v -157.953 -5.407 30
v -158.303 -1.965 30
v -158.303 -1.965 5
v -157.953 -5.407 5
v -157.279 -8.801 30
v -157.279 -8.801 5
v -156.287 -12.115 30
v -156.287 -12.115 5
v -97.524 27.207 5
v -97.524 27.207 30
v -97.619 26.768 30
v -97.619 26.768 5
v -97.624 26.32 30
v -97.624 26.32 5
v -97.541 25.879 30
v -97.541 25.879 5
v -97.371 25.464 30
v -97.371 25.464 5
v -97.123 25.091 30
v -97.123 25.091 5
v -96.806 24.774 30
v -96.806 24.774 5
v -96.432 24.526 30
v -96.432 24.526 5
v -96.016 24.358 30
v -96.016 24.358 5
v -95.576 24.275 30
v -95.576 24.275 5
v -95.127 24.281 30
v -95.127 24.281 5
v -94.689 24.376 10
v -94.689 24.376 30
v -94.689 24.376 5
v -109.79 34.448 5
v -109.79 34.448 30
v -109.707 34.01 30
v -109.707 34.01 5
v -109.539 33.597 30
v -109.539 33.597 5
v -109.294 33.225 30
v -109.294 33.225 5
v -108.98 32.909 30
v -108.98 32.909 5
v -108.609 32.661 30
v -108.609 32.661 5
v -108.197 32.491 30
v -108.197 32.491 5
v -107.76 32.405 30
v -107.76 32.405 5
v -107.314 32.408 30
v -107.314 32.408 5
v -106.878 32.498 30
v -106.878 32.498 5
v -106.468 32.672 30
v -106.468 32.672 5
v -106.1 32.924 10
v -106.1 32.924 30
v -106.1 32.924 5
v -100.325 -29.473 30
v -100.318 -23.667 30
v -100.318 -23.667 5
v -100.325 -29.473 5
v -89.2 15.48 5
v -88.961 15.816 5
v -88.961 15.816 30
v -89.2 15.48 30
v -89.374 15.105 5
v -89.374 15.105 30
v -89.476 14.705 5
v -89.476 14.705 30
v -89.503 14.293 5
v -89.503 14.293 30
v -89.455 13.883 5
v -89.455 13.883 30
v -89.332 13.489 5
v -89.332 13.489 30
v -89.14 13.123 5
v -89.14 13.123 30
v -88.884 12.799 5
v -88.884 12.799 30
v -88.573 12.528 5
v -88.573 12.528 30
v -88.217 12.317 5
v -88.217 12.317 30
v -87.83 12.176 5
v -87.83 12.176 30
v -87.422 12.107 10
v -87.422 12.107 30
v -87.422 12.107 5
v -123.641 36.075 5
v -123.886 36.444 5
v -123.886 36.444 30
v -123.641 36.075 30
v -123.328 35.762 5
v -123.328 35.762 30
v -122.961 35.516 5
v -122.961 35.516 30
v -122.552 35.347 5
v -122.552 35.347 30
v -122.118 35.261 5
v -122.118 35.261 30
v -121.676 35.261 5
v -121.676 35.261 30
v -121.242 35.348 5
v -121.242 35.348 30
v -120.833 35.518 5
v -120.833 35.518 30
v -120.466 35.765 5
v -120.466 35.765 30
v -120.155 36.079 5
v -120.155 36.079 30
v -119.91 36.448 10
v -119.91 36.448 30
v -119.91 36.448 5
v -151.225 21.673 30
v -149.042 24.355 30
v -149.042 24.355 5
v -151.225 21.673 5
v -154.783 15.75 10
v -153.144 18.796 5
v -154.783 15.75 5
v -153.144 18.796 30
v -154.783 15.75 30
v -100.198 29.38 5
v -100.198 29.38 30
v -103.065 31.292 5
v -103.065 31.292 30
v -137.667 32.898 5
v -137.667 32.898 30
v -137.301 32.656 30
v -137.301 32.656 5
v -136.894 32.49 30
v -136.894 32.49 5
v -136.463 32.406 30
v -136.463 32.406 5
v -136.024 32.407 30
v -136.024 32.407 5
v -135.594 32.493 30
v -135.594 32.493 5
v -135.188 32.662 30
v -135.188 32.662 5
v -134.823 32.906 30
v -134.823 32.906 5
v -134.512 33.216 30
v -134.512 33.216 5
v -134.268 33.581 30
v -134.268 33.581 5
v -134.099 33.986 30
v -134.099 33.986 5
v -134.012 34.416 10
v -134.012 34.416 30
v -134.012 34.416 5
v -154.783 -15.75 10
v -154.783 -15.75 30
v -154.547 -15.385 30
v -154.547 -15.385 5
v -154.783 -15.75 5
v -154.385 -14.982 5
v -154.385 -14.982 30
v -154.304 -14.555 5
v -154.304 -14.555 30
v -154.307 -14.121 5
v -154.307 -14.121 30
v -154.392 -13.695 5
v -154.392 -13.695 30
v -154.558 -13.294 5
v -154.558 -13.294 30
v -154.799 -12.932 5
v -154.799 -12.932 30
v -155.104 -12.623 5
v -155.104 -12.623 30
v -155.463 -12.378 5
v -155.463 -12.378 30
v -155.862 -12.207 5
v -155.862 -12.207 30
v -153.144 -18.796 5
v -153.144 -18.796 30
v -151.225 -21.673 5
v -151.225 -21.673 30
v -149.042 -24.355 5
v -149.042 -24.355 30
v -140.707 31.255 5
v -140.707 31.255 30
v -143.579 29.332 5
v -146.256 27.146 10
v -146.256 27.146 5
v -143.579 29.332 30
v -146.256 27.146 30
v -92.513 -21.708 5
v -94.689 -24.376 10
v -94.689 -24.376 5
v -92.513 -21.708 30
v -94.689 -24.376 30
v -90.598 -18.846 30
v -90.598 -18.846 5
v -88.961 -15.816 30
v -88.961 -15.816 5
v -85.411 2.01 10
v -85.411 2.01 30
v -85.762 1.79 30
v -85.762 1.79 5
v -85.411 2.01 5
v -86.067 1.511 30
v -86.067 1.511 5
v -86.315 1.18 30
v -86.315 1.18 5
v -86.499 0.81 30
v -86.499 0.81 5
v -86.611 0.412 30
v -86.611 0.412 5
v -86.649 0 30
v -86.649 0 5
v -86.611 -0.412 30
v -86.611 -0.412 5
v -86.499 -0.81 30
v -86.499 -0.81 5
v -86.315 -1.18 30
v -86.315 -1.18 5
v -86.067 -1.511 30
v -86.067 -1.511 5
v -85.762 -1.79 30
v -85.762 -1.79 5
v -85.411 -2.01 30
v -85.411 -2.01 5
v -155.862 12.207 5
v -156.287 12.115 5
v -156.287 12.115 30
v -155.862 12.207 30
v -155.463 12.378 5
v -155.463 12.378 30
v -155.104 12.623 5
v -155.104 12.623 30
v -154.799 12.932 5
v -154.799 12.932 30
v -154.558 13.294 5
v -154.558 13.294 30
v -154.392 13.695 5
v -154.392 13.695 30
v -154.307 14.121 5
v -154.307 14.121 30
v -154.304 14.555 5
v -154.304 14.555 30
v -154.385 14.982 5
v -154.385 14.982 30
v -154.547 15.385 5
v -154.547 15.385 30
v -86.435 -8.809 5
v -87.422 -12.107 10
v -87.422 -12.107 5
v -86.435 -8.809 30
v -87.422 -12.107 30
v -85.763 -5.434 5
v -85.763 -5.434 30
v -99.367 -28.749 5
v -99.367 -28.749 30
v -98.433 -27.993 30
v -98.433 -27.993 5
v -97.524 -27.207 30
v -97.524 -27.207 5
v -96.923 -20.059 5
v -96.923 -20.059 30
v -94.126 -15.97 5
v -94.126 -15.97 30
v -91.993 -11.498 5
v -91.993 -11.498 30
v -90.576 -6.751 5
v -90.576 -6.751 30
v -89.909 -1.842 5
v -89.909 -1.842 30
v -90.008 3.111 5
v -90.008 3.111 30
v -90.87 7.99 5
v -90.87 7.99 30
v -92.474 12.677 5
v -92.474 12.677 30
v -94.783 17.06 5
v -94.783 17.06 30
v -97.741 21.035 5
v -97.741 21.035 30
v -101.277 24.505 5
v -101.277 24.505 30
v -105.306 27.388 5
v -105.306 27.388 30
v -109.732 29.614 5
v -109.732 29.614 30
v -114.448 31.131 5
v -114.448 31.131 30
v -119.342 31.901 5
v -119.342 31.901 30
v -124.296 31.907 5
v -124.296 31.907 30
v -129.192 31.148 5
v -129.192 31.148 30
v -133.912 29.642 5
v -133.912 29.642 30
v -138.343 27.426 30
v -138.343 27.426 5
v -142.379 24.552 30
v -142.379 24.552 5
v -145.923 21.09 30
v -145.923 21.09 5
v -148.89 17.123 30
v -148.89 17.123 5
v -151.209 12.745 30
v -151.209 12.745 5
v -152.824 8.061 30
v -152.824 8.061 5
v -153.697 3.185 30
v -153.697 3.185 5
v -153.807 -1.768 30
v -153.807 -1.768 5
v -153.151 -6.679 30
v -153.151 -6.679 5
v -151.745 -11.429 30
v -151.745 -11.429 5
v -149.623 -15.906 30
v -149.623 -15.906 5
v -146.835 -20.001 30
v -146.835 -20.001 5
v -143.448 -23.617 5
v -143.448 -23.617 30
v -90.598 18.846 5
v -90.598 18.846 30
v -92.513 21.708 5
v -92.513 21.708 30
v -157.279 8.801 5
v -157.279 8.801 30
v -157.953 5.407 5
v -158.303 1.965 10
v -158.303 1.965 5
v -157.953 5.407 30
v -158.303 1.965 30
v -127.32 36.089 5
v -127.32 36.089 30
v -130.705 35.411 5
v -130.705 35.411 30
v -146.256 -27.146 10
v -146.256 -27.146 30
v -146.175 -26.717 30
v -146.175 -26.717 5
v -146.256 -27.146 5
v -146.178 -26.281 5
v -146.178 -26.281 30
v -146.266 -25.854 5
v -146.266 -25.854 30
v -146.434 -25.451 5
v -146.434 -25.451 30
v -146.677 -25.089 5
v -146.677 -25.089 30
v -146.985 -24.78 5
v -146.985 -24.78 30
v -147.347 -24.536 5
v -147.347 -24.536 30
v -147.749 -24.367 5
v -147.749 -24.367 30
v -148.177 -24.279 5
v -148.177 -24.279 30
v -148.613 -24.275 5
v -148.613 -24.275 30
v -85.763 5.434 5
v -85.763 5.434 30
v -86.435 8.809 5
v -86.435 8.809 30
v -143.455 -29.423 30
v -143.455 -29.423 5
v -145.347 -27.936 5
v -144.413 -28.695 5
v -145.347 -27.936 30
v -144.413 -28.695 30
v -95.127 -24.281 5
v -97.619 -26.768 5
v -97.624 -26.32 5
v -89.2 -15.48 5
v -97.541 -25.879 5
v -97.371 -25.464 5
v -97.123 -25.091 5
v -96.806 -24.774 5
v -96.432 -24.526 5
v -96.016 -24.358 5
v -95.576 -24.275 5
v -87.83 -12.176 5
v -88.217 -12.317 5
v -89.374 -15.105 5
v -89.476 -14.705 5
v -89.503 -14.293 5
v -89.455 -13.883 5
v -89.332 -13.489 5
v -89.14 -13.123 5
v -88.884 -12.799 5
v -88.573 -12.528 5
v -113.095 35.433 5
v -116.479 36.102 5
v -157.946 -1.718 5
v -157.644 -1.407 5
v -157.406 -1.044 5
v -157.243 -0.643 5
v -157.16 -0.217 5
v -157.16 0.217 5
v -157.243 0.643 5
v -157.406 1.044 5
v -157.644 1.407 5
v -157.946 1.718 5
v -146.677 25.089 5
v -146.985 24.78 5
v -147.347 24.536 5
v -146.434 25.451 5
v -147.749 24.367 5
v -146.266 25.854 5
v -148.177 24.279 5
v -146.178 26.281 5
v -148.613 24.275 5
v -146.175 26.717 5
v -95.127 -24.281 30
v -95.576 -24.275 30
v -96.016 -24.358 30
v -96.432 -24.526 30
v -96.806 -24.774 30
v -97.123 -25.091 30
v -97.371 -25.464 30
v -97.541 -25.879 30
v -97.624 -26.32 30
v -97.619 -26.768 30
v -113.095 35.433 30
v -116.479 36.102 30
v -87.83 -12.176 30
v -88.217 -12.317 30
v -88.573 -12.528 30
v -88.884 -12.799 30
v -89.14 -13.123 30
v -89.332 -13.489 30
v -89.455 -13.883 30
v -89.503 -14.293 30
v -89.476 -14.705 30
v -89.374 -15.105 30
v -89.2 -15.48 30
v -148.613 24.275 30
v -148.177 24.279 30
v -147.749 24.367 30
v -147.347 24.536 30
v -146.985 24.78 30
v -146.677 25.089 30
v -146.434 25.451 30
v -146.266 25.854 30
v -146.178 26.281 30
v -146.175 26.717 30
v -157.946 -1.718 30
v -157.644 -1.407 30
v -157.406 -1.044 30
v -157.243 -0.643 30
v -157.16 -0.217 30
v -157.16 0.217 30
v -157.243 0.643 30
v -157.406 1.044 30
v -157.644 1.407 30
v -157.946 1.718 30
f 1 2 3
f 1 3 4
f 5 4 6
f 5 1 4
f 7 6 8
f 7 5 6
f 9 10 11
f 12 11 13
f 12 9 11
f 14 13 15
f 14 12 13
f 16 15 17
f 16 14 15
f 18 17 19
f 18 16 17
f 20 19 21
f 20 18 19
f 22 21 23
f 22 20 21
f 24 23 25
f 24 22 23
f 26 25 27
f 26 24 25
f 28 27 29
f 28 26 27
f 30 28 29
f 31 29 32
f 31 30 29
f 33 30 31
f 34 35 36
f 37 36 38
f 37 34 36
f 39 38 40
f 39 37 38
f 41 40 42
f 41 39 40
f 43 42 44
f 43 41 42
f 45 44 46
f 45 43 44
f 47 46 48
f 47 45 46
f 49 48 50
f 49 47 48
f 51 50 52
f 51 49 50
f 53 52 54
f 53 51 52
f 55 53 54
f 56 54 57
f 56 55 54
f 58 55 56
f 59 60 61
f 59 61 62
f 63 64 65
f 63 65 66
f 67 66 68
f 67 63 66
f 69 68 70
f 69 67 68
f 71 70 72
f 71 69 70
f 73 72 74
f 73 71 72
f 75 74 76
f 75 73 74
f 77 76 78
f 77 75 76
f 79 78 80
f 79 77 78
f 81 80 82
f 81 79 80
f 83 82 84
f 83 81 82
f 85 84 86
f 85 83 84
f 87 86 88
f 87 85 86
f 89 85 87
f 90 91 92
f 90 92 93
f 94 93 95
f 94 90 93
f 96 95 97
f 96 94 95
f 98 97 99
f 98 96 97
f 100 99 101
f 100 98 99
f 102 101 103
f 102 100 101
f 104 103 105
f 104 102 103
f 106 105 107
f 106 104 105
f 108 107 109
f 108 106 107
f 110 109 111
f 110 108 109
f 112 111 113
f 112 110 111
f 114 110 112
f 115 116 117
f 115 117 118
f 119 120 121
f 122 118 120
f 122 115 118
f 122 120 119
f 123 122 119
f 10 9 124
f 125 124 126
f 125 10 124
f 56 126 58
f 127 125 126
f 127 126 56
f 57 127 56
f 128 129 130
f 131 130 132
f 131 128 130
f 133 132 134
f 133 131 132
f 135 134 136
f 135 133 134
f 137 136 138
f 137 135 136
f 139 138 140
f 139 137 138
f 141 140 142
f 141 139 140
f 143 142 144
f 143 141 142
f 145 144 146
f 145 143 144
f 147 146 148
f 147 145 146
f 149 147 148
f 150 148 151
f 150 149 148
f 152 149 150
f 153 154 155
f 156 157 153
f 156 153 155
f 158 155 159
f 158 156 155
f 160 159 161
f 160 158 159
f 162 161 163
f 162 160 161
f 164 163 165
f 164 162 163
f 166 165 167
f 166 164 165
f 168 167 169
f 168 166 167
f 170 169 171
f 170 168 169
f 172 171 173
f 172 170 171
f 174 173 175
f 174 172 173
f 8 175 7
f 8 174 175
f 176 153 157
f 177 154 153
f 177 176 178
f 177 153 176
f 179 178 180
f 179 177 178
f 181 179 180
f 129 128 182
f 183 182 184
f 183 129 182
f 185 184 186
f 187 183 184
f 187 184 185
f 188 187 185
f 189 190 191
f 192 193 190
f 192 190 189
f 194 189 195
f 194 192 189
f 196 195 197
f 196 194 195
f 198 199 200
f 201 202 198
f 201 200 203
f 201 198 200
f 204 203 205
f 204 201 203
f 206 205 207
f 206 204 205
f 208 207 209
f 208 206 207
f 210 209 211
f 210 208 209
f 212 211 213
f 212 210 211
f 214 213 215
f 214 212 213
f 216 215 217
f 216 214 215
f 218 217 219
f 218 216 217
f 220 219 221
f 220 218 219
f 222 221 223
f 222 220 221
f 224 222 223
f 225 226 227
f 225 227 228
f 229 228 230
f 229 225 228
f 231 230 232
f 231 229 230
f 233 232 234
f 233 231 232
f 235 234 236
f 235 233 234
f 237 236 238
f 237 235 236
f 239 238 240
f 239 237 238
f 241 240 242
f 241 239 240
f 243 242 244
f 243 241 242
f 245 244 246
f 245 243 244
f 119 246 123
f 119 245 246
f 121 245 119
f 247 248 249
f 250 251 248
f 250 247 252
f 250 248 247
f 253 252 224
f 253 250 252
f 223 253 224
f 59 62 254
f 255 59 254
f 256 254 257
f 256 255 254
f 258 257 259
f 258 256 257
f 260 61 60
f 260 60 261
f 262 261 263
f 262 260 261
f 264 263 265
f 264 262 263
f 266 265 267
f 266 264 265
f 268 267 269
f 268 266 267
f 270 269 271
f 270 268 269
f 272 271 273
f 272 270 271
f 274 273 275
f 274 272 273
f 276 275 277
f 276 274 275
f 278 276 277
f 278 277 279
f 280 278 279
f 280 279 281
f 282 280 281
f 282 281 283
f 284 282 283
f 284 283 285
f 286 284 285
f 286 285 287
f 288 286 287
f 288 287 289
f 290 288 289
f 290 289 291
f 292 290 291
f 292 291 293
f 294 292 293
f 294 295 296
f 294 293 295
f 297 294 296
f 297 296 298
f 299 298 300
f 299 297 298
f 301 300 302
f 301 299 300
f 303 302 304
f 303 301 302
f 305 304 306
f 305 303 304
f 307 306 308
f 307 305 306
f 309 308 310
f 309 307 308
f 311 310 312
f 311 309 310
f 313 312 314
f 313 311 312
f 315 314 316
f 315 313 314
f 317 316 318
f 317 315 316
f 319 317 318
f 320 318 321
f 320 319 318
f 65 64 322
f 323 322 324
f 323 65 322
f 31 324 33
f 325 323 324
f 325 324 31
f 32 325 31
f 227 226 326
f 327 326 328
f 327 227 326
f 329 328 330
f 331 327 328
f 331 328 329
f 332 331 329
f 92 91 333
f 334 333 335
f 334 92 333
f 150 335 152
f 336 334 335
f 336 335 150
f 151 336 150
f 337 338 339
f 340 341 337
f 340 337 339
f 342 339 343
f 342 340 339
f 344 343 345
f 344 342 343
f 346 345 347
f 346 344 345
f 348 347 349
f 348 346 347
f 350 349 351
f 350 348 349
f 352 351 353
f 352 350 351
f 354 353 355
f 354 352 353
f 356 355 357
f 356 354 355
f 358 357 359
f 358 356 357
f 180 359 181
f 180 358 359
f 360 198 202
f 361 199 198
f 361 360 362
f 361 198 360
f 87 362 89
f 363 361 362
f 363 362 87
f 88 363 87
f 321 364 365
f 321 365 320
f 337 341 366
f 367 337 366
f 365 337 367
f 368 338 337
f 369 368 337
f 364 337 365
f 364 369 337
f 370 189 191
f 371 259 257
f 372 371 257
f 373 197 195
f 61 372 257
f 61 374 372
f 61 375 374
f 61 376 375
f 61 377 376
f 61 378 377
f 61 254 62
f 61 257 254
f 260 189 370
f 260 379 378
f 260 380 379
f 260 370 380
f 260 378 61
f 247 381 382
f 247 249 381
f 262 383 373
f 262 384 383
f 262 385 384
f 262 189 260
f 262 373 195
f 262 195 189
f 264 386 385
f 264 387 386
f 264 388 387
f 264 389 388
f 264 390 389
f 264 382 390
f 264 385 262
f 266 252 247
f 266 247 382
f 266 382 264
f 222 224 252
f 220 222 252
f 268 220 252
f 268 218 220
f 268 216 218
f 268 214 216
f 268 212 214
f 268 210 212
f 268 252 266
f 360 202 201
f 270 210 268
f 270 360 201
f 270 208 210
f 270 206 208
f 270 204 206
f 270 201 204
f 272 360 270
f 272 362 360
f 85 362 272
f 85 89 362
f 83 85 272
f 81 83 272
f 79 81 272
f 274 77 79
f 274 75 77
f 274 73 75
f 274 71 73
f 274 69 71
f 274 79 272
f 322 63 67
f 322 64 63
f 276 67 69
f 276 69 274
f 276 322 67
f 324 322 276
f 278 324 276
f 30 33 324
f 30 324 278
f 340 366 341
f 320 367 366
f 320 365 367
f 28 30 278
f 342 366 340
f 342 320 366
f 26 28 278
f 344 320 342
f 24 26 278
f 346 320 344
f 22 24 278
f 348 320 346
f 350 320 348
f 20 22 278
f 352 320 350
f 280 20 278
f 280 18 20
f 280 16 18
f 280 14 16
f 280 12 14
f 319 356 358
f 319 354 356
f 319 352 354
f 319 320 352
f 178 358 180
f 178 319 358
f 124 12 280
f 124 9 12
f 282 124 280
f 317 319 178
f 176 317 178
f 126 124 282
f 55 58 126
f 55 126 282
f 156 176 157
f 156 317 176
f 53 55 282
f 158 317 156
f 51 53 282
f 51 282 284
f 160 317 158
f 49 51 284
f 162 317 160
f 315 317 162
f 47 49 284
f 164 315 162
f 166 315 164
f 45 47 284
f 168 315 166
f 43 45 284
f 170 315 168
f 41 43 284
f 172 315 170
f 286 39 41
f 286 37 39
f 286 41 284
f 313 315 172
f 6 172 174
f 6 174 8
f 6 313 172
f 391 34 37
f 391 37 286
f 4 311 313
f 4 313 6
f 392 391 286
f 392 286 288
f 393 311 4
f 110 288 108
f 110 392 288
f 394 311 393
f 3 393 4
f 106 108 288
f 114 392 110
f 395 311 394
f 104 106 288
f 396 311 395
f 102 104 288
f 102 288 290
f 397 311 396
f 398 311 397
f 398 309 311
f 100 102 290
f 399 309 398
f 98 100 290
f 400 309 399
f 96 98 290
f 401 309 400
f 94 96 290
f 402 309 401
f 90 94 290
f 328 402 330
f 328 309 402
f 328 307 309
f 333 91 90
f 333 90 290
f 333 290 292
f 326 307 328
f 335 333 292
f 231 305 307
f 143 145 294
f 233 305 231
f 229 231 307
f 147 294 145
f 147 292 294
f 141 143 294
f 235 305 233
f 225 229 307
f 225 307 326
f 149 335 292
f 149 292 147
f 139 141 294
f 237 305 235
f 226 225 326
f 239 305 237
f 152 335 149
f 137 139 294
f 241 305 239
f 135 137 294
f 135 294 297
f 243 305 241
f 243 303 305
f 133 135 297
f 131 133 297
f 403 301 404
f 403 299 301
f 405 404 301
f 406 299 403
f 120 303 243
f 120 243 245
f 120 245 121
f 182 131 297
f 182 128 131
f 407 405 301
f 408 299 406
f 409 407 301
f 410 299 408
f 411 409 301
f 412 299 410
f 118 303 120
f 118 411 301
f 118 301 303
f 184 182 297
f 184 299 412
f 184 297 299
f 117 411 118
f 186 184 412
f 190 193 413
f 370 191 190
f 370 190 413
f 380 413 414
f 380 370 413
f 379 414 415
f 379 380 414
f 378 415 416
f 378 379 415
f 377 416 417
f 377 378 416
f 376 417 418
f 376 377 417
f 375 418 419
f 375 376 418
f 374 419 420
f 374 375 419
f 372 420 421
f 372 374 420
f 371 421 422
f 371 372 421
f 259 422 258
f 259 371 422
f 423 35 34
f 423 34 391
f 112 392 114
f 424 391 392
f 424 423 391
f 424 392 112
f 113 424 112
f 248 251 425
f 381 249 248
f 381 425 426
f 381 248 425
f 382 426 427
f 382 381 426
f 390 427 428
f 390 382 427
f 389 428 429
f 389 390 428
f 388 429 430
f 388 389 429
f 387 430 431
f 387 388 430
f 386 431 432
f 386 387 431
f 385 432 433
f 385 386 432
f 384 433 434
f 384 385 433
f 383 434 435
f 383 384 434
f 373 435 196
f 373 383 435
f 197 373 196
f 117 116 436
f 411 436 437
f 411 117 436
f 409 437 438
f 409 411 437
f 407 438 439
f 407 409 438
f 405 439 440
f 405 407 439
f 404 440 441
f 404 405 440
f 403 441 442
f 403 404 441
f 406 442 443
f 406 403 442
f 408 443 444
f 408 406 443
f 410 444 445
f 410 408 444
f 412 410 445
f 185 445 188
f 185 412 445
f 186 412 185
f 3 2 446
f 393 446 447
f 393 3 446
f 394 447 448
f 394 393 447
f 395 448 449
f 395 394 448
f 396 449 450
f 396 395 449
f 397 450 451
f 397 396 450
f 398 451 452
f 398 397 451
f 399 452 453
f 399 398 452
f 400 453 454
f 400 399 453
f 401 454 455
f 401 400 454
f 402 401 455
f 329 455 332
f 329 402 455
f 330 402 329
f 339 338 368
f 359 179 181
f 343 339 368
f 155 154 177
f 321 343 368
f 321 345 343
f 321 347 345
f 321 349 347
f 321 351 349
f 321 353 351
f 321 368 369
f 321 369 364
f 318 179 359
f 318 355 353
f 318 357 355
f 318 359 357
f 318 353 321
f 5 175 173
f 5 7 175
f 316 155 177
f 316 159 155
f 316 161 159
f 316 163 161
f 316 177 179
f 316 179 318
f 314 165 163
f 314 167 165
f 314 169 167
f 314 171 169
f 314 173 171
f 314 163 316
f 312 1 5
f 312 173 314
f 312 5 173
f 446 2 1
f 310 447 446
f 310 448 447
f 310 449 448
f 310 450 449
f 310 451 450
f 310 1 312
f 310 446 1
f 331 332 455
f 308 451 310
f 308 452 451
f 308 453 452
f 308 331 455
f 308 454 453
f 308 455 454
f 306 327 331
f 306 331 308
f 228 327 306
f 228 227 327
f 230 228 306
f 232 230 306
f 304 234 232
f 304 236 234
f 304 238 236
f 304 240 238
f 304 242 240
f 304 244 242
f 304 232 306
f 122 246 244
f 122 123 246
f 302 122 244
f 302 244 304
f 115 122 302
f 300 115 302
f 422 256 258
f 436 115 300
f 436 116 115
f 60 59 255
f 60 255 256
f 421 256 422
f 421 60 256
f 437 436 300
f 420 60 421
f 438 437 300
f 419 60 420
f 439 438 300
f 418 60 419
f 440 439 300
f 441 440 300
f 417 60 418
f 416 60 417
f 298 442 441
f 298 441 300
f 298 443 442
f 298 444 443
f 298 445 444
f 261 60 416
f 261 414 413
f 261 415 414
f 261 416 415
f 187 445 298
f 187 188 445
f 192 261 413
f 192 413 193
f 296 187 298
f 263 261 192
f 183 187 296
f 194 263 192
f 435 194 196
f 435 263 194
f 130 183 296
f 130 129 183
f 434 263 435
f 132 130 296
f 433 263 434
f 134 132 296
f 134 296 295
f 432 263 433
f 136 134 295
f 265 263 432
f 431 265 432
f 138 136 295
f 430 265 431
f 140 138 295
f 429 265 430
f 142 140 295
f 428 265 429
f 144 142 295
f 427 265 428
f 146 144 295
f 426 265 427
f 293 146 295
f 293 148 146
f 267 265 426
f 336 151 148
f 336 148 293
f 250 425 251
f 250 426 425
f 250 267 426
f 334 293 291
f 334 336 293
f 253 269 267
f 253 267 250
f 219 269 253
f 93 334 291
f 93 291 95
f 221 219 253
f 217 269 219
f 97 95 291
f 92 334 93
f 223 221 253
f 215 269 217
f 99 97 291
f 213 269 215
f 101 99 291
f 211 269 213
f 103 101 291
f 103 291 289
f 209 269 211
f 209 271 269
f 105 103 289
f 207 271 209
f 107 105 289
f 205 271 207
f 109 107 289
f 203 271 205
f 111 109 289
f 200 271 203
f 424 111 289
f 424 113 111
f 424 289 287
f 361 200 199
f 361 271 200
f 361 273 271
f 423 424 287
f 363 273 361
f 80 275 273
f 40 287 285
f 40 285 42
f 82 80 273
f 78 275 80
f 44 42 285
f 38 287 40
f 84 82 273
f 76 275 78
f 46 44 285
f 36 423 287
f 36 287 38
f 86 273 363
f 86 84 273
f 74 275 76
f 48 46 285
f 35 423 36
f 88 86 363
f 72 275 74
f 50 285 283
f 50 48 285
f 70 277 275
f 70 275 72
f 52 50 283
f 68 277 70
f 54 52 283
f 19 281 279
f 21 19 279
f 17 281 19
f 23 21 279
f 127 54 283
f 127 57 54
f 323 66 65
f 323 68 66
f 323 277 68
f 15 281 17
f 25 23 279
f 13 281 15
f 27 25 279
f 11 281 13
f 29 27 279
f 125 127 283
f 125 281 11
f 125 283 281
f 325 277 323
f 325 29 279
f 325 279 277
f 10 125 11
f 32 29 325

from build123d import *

# Parameters (mm, degrees)
SKETCH3_W               = 140.131000148
SKETCH3_H               = 140
BOSS_EXTRUDE3_DEPTH     = 30
SKETCH3_7_OUTSIDE_W     = 182.199
SKETCH3_7_OUTSIDE_H     = 182.068
SKETCH3_7_OUTSIDE_W_2   = 140.131000148
SKETCH3_7_OUTSIDE_H_2   = 140
SKETCH3_7_OUTSIDE_R     = 32
CUT_EXTRUDE5_DEPTH      = 35
CUT_EXTRUDE6_DEPTH      = 10
CUT_EXTRUDE6_DEPTH_BACK = 5
SKETCH2_R               = 2.25
CUT_EXTRUDE8_DEPTH      = 207.479750358
CUT_EXTRUDE8_DEPTH_BACK = 207.479750358
SKETCH4_OUTSIDE_W       = 182.199
SKETCH4_OUTSIDE_H       = 182.068
SKETCH4_OUTSIDE_R       = 42.5
SKETCH5_OUTSIDE_W       = 111.78
SKETCH5_OUTSIDE_H       = 111.78
SKETCH5_OUTSIDE_R       = 36.5
CUT_EXTRUDE9_DEPTH      = 25
SKETCH2_3_R             = 2.25
CUT_EXTRUDE10_DEPTH     = 30
CUT_EXTRUDE14_DEPTH     = 25
SKETCH16_R              = 42.5
CUT_EXTRUDE15_DEPTH     = 5


with BuildPart() as part:
    # Sketch3 → Boss-Extrude3 (new body)
    with BuildSketch(Plane.XY):
        with Locations((-121.856065437, 0)):
            Rectangle(SKETCH3_W, SKETCH3_H)
    extrude(amount=BOSS_EXTRUDE3_DEPTH)

    # Sketch3<7> outside → Cut-Extrude5 (cut)
    # profile 1 of 2: a face of its own
    with BuildSketch(Plane.XY):
        with Locations((-121.8565, 0)):
            Rectangle(SKETCH3_7_OUTSIDE_W, SKETCH3_7_OUTSIDE_H)
        with Locations((-121.856065437, 0)):
            Rectangle(SKETCH3_7_OUTSIDE_W_2, SKETCH3_7_OUTSIDE_H_2, mode=Mode.SUBTRACT)
    # profile 2 of 2: a face of its own
    with BuildSketch(Plane.XY):
        with Locations((-121.856065437, 0)):
            Circle(SKETCH3_7_OUTSIDE_R)
    extrude(amount=CUT_EXTRUDE5_DEPTH, mode=Mode.SUBTRACT)

    # Sketch2 → Cut-Extrude6 (cut, two sides: drawn at the far end of the back side and taken through both)
    with BuildSketch(Plane.XY.offset(-CUT_EXTRUDE6_DEPTH_BACK)):
        with Locations((-107.548664291, 34.645482469)):
            Circle(SKETCH2_R)
        with Locations((-95.38278871, 26.516504294)):
            Circle(SKETCH2_R)
        with Locations((-87.253810535, 14.350628714)):
            Circle(SKETCH2_R)
        with Locations((-84.399293004, 0)):
            Circle(SKETCH2_R)
        with Locations((-87.253810535, -14.350628714)):
            Circle(SKETCH2_R)
        with Locations((-95.38278871, -26.516504294)):
            Circle(SKETCH2_R)
        with Locations((-107.548664291, -34.645482469)):
            Circle(SKETCH2_R)
        with Locations((-121.899293004, -37.5)):
            Circle(SKETCH2_R)
        with Locations((-136.249921718, -34.645482469)):
            Circle(SKETCH2_R)
        with Locations((-148.415797299, -26.516504294)):
            Circle(SKETCH2_R)
        with Locations((-156.544775474, -14.350628714)):
            Circle(SKETCH2_R)
        with Locations((-159.399293004, 0)):
            Circle(SKETCH2_R)
        with Locations((-156.544775474, 14.350628714)):
            Circle(SKETCH2_R)
        with Locations((-148.415797299, 26.516504294)):
            Circle(SKETCH2_R)
        with Locations((-136.249921718, 34.645482469)):
            Circle(SKETCH2_R)
        with Locations((-121.899293004, 37.5)):
            Circle(SKETCH2_R)
    extrude(amount=CUT_EXTRUDE6_DEPTH + CUT_EXTRUDE6_DEPTH_BACK, mode=Mode.SUBTRACT)

    # Sketch4 outside → Cut-Extrude8 (cut, two sides: drawn at the far end of the back side and taken through both)
    with BuildSketch(Plane.XY.offset(30).offset(-CUT_EXTRUDE8_DEPTH_BACK)):
        with Locations((-121.8565, 0)):
            Rectangle(SKETCH4_OUTSIDE_W, SKETCH4_OUTSIDE_H)
        with Locations((-121.856065437, 0)):
            Circle(SKETCH4_OUTSIDE_R, mode=Mode.SUBTRACT)
    extrude(amount=CUT_EXTRUDE8_DEPTH + CUT_EXTRUDE8_DEPTH_BACK, mode=Mode.SUBTRACT)

    # Sketch5 outside → Cut-Extrude9 (cut)
    with BuildSketch(Plane.XY.offset(30)):
        with Locations((-121.856, 0)):
            Rectangle(SKETCH5_OUTSIDE_W, SKETCH5_OUTSIDE_H)
        with Locations((-121.856065437, 0)):
            Circle(SKETCH5_OUTSIDE_R, mode=Mode.SUBTRACT)
    extrude(amount=-CUT_EXTRUDE9_DEPTH, mode=Mode.SUBTRACT)

    # Sketch2<3> → Cut-Extrude10 (cut)
    with BuildSketch(Plane.XY):
        with Locations((-107.548664291, 34.645482469)):
            Circle(SKETCH2_3_R)
        with Locations((-95.38278871, 26.516504294)):
            Circle(SKETCH2_3_R)
        with Locations((-87.253810535, 14.350628714)):
            Circle(SKETCH2_3_R)
        with Locations((-84.399293004, 0)):
            Circle(SKETCH2_3_R)
        with Locations((-87.253810535, -14.350628714)):
            Circle(SKETCH2_3_R)
        with Locations((-95.38278871, -26.516504294)):
            Circle(SKETCH2_3_R)
        with Locations((-107.548664291, -34.645482469)):
            Circle(SKETCH2_3_R)
        with Locations((-121.899293004, -37.5)):
            Circle(SKETCH2_3_R)
        with Locations((-136.249921718, -34.645482469)):
            Circle(SKETCH2_3_R)
        with Locations((-148.415797299, -26.516504294)):
            Circle(SKETCH2_3_R)
        with Locations((-156.544775474, -14.350628714)):
            Circle(SKETCH2_3_R)
        with Locations((-159.399293004, 0)):
            Circle(SKETCH2_3_R)
        with Locations((-156.544775474, 14.350628714)):
            Circle(SKETCH2_3_R)
        with Locations((-148.415797299, 26.516504294)):
            Circle(SKETCH2_3_R)
        with Locations((-136.249921718, 34.645482469)):
            Circle(SKETCH2_3_R)
        with Locations((-121.899293004, 37.5)):
            Circle(SKETCH2_3_R)
    extrude(amount=CUT_EXTRUDE10_DEPTH, mode=Mode.SUBTRACT)

    # Sketch15 → Cut-Extrude14 (cut)
    with BuildSketch(Plane.XY.offset(30)):
        with BuildLine():
            Line((-143.464225434, -37.475141345), (-143.420997866, 0.024858655))
            ThreePointArc((-143.420997866, 0.024858655), (-121.831206782, 21.564932429), (-100.291133008, -0.024858655))
            Line((-100.291133008, -0.024858655), (-100.334360575, -37.524858655))
            ThreePointArc((-100.334360575, -37.524858655), (-121.92415166, -59.064932429), (-143.464225434, -37.475141345))
        make_face()
    extrude(amount=-CUT_EXTRUDE14_DEPTH, mode=Mode.SUBTRACT)

    # Sketch16 → Cut-Extrude15 (cut)
    with BuildSketch(Plane(origin=(0, 0, 0), x_dir=(-1, 0, 0), z_dir=(0, 0, -1))):
        with Locations((121.856065437, 0)):
            Circle(SKETCH16_R)
    extrude(amount=-CUT_EXTRUDE15_DEPTH, mode=Mode.SUBTRACT)


solid = part.part
